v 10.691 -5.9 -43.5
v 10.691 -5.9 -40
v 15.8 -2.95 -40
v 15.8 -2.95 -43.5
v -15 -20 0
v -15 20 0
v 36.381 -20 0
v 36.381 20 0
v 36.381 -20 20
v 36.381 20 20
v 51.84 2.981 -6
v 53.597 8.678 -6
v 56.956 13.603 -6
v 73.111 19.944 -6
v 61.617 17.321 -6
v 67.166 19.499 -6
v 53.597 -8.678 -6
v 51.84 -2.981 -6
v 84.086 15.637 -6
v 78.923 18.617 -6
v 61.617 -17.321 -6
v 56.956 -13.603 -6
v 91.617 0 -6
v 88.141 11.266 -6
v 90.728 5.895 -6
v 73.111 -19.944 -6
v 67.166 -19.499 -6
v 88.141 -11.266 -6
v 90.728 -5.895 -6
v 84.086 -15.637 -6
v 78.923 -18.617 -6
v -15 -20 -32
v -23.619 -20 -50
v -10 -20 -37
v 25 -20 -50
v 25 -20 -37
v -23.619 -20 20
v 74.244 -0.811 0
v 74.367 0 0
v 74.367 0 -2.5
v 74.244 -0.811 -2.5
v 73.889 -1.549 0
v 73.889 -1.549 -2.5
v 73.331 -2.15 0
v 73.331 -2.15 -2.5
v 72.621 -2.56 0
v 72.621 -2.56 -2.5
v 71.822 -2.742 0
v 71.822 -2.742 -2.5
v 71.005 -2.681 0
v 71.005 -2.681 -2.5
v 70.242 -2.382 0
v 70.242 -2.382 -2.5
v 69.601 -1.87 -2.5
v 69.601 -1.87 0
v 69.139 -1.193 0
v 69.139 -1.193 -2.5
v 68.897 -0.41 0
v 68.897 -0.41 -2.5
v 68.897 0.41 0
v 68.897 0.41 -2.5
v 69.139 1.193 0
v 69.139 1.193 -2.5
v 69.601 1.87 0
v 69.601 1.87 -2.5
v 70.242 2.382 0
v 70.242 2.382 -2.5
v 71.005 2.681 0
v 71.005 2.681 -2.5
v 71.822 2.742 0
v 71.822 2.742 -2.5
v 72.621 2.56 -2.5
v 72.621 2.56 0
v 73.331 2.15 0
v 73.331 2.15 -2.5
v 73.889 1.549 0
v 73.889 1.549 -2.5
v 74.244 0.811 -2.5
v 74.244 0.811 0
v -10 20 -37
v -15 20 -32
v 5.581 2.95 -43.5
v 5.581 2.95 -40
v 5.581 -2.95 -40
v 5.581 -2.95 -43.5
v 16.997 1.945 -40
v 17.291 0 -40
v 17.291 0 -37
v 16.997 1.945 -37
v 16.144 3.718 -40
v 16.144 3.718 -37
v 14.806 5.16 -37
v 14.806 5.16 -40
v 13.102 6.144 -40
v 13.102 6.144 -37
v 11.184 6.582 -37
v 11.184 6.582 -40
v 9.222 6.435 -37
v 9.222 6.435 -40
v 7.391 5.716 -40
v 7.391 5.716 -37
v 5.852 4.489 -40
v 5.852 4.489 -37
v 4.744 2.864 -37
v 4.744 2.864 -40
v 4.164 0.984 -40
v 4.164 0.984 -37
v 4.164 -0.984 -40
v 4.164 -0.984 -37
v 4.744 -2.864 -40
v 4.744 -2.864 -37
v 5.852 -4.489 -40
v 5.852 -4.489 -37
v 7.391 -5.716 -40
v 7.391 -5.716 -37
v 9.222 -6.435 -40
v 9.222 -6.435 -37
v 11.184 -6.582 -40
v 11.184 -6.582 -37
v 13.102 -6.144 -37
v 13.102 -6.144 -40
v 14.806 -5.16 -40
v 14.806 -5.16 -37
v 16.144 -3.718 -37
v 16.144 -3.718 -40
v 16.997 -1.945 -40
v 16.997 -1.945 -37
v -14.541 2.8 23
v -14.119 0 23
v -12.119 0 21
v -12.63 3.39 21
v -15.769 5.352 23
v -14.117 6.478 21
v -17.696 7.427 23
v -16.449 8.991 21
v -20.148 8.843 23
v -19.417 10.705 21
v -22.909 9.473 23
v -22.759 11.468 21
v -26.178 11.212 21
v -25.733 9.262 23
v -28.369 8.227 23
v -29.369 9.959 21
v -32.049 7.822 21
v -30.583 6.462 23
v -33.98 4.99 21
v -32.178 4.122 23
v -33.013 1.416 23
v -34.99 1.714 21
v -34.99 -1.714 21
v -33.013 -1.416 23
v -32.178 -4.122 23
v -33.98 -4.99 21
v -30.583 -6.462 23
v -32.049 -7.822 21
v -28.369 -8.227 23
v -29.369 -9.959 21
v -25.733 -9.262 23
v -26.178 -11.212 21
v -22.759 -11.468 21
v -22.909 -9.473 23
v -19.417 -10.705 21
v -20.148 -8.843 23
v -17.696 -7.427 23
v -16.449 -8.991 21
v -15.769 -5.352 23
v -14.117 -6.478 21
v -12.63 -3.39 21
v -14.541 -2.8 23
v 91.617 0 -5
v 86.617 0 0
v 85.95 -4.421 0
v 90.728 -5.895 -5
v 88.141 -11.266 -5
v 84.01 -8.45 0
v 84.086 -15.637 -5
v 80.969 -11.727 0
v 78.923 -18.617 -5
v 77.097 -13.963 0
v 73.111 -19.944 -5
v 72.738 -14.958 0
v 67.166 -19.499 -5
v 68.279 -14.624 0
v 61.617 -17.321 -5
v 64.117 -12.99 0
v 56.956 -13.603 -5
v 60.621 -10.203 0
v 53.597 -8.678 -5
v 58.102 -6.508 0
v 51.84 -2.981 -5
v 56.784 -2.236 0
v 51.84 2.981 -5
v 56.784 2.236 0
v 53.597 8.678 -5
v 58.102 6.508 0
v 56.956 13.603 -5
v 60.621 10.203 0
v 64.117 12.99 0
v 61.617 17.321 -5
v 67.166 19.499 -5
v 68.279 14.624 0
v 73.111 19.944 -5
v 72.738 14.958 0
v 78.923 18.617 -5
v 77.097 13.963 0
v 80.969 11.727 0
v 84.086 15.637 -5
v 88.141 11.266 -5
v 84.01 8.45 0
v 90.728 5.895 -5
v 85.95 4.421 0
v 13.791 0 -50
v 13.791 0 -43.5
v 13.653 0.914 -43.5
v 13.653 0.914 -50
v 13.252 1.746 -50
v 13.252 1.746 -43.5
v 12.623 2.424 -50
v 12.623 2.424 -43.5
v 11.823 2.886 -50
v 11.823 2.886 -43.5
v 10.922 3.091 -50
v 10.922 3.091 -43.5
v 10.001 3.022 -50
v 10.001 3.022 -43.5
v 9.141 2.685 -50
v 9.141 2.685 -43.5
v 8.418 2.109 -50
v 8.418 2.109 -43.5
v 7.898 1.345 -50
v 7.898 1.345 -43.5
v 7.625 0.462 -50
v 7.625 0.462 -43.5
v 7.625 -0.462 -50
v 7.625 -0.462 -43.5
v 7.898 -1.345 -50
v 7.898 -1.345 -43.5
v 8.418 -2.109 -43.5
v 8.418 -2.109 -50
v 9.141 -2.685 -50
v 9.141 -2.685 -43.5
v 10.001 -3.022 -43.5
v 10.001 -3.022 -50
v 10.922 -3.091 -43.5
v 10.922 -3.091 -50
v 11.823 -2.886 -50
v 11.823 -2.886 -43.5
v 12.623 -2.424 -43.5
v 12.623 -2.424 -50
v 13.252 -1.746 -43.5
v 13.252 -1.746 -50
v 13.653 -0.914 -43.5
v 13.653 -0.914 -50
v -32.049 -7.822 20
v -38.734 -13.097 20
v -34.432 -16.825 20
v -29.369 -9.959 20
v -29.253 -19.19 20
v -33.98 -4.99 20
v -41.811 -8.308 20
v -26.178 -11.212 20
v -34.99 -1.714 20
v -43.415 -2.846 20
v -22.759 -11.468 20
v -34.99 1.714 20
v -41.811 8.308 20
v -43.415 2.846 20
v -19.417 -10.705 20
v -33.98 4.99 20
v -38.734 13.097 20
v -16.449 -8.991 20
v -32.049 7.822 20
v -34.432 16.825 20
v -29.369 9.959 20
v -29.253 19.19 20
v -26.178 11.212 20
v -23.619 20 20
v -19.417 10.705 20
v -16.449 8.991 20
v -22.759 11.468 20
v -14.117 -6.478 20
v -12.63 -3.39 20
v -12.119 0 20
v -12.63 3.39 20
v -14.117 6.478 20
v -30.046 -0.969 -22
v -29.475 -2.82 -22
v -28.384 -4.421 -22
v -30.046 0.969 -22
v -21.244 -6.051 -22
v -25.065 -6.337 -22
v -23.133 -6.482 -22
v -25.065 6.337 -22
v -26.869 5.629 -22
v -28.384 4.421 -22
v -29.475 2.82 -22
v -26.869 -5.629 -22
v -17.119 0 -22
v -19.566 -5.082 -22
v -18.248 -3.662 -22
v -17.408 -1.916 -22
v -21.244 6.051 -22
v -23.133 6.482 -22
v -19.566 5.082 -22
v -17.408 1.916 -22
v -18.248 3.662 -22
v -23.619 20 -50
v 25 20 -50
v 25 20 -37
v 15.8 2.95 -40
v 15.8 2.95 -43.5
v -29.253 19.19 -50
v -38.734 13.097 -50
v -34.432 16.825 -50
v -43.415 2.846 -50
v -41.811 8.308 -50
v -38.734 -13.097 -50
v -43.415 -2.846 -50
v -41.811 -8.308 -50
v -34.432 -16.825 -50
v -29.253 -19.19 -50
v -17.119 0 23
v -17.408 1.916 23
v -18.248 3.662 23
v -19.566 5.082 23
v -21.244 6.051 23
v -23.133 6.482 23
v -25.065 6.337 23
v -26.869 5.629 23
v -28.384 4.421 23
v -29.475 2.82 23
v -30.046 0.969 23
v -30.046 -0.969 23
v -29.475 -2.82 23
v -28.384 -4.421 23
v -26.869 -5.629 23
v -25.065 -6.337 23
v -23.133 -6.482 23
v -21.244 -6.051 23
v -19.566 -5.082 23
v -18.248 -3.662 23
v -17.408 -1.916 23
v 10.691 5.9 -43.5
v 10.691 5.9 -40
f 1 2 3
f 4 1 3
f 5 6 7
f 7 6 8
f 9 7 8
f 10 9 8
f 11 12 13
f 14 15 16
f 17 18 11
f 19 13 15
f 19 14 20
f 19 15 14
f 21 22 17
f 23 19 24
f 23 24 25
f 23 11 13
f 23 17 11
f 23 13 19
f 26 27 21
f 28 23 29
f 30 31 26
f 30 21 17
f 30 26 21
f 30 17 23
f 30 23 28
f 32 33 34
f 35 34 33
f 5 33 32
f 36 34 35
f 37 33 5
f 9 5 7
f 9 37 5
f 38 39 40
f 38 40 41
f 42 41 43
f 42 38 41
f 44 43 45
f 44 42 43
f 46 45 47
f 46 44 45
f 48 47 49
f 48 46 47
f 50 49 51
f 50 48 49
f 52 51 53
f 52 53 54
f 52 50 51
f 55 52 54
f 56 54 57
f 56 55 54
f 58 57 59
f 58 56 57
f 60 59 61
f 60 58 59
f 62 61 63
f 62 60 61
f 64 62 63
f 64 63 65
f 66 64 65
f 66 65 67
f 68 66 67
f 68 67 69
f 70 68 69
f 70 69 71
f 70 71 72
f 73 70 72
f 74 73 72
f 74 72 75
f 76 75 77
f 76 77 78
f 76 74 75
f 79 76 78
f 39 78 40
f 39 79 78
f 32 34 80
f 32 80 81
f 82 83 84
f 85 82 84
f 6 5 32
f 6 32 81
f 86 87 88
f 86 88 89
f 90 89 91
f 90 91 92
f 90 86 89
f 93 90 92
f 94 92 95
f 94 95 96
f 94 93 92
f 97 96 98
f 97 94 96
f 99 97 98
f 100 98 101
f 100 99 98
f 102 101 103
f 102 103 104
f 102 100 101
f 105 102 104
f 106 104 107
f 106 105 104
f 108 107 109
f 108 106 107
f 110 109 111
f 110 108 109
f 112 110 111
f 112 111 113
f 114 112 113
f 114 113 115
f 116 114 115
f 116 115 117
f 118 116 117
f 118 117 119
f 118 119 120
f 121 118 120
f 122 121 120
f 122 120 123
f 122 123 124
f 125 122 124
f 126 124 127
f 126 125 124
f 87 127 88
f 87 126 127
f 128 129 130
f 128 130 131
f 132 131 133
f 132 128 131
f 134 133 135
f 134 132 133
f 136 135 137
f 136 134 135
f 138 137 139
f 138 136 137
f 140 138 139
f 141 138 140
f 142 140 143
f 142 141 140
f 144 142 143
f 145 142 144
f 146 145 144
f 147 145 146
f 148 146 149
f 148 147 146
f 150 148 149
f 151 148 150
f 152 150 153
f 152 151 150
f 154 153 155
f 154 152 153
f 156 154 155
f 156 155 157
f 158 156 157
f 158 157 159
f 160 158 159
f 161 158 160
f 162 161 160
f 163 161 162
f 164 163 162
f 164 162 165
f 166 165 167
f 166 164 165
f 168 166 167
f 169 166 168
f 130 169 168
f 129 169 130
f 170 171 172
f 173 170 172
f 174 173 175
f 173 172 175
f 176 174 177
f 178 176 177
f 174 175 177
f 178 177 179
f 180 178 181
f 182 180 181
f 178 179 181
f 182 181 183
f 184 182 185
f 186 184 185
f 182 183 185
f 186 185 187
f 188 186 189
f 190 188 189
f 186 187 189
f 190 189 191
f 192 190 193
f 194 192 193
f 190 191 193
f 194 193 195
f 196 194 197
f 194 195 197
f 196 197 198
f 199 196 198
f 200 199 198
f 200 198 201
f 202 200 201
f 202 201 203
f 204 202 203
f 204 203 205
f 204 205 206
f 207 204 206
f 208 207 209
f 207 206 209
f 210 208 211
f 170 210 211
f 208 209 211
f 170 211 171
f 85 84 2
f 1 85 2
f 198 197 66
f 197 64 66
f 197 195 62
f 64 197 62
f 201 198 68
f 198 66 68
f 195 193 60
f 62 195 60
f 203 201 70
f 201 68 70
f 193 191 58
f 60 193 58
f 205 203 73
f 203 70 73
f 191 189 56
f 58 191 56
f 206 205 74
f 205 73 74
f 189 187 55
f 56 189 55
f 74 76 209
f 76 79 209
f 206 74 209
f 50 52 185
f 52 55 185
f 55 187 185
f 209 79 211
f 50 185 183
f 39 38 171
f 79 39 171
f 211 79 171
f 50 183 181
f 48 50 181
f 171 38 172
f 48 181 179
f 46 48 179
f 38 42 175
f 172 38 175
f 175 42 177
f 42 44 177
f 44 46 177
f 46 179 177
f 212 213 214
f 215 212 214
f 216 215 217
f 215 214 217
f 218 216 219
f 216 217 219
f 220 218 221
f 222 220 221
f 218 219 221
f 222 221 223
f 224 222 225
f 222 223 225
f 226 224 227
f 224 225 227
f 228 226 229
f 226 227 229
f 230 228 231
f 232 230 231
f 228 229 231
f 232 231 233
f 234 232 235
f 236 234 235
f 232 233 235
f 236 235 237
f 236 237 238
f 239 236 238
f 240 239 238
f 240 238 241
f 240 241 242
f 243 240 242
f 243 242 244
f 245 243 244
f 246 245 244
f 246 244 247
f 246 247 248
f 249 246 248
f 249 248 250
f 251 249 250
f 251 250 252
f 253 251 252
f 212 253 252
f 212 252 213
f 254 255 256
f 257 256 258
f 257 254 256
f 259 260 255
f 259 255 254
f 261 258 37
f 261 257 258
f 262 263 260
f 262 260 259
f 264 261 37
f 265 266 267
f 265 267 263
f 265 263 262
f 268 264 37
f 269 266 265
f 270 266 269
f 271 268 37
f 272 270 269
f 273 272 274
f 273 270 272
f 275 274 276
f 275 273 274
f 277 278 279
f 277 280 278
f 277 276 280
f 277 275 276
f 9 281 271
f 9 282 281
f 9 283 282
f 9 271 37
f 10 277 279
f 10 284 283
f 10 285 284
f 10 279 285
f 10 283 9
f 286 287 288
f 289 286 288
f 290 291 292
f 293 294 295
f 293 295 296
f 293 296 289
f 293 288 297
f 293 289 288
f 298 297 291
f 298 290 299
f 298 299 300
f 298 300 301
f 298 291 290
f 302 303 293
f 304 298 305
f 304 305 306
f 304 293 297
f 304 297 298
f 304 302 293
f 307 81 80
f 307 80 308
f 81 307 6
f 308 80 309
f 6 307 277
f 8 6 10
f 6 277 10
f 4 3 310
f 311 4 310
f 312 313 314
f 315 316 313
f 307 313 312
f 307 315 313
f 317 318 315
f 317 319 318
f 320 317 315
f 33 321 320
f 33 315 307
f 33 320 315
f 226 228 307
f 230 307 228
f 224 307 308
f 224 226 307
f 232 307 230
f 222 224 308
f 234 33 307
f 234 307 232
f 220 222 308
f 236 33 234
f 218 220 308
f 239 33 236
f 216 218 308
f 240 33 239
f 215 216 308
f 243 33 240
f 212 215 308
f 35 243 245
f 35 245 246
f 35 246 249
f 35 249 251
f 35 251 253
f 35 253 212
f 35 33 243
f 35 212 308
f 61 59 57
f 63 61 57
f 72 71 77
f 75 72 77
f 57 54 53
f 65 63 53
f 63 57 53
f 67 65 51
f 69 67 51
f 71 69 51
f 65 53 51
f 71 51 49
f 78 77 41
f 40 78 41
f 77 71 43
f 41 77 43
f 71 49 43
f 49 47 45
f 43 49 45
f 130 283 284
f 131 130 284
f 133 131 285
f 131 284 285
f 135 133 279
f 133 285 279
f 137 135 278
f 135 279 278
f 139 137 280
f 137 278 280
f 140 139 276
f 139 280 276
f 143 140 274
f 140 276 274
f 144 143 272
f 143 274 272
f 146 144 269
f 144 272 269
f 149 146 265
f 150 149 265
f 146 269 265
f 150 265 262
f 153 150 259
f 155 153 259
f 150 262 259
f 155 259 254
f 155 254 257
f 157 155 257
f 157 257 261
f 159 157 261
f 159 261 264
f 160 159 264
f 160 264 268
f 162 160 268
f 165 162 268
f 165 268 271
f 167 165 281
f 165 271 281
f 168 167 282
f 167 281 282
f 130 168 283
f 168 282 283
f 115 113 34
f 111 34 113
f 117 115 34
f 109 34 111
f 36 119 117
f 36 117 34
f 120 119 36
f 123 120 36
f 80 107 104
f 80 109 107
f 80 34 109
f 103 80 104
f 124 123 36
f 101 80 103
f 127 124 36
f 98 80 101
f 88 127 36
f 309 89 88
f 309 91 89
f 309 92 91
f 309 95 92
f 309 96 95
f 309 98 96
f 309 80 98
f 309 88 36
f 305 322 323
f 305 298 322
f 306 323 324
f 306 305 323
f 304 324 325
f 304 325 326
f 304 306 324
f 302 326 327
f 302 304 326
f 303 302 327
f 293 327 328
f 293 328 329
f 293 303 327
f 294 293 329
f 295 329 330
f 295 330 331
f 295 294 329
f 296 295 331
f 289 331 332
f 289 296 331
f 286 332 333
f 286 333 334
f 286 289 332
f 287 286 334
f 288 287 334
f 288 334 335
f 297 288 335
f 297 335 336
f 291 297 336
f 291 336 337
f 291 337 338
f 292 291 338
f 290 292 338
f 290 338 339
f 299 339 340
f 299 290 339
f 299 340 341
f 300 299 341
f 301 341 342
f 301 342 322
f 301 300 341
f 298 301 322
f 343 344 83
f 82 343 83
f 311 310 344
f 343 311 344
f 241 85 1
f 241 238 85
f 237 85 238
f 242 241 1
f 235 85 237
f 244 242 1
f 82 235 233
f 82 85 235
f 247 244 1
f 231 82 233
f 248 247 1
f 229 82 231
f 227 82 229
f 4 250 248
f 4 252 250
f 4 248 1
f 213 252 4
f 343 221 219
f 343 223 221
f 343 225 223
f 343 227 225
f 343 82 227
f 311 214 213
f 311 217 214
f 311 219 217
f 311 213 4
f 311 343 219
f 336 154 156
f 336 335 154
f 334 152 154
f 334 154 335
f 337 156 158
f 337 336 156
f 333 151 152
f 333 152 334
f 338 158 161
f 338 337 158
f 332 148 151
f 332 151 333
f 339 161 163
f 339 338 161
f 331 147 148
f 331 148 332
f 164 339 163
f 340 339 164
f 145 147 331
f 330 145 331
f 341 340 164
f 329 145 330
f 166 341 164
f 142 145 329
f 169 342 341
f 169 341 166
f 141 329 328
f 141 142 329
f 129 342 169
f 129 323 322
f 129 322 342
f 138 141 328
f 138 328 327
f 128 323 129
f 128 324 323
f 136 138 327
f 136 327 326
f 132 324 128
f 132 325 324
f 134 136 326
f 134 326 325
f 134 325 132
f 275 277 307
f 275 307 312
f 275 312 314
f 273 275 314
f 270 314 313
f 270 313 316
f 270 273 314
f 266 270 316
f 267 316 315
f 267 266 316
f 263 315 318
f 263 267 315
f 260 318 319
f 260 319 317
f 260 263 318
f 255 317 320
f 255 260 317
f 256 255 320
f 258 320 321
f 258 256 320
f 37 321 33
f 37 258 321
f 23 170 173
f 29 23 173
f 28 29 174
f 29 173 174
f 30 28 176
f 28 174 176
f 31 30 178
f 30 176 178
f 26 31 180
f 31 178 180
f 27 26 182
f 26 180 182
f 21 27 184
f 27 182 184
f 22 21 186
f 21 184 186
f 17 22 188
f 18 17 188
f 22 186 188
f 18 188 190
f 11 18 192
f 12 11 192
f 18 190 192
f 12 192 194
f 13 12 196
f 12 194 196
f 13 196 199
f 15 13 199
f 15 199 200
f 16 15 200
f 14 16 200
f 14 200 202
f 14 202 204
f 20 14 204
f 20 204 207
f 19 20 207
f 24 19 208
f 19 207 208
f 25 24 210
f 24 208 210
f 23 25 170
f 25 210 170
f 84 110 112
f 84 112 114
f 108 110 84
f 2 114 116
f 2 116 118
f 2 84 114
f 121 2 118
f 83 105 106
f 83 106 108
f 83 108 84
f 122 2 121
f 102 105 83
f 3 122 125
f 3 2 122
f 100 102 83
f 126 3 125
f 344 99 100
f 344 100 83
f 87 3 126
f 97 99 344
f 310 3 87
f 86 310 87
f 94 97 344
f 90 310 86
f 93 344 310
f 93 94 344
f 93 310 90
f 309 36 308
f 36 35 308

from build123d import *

# Parameters (mm, degrees)
F0_R      = 6.5
F1_DEPTH  = 20
F3_DEPTH  = 50
F4_DEPTH  = 22
F5_W      = 40
F5_H      = 40
F6_DEPTH  = 10
F7_R      = 11.5
F7_R_2    = 6.5
F8_DEPTH  = 3
F9_SIZE   = 2
F11_DEPTH = 3.5
F10_W     = 40
F10_H     = 40
F10_R     = 6.6
F12_DEPTH = 3
F13_DEPTH = 3
F14_D     = 6.2
F14_DEPTH = 10.001
F15_R     = 20
F15_R_2   = 2.75
F16_DEPTH = 6
F17_SIZE  = 5
F18_DEPTH = 2.5
F19_ANGLE = 180
F21_DEPTH = 40


with BuildPart() as f1:
    # F0 (on Top) → F1 (new body)
    with BuildSketch(Plane.XY):
        with BuildLine():
            Line((36.3812413297, 20), (-23.6187586703, 20))
            ThreePointArc((-23.6187586703, 20), (-9.4766230466, 14.1421356237), (-3.6187586703, 0))
            ThreePointArc((-3.6187586703, 0), (-9.4766230466, -14.1421356237), (-23.6187586703, -20))
            Line((-23.6187586703, -20), (36.3812413297, -20))
            Line((36.3812413297, -20), (36.3812413297, 20))
        make_face()
        with BuildLine():
            ThreePointArc((-3.6187586703, 0), (-9.4766230466, 14.1421356237), (-23.6187586703, 20))
            ThreePointArc((-23.6187586703, 20), (-43.6187586703, 0), (-23.6187586703, -20))
            ThreePointArc((-23.6187586703, -20), (-9.4766230466, -14.1421356237), (-3.6187586703, 0))
        make_face()
        with Locations((-23.6187586703, 0)):
            Circle(F0_R, mode=Mode.SUBTRACT)
    extrude(amount=F1_DEPTH)

    # F2 (on Top) → F3 (join)
    with BuildSketch(Plane.XY):
        with BuildLine():
            Line((-15, -20), (-15, 20))
            Line((-15, 20), (-23.6187586703, 20))
            ThreePointArc((-23.6187586703, 20), (-43.6187586703, 0), (-23.6187586703, -20))
            Line((-23.6187586703, -20), (-15, -20))
        make_face()
    extrude(amount=-F3_DEPTH)

    # F0 (on Top) → F4 (cut)
    with BuildSketch(Plane.XY):
        with Locations((-23.6187586703, 0)):
            Circle(F0_R)
    extrude(amount=-F4_DEPTH, mode=Mode.SUBTRACT)

    # F5 (on face) → F6 (join)
    with BuildSketch(Plane(origin=(0, 0, -50), x_dir=(1, 0, 0), z_dir=(0, 0, -1))):
        with Locations((5, 0)):
            Rectangle(F5_W, F5_H)
    extrude(amount=-F6_DEPTH)

    # F7 (on face) → F8 (join)
    with BuildSketch(Plane.XY.offset(20)):
        with Locations((-23.6187586703, 0)):
            Circle(F7_R)
        with Locations((-23.6187586703, 0)):
            Circle(F7_R_2, mode=Mode.SUBTRACT)
    extrude(amount=F8_DEPTH)

    # F9
    f9_edges = [f1.edges().sort_by_distance(p)[0] for p in [
        (-35.118759, 0, 23),
    ]]
    chamfer(f9_edges, length=F9_SIZE)

    # F10 (on face) → F11 (cut)
    with BuildSketch(Plane.XY.offset(-40)):
        Polygon((5.5810707825, 2.95), (5.5810707825, -2.95), (10.6906206648, -5.9), (15.8001705472, -2.95), (15.8001705472, 2.95), (10.6906206648, 5.9), align=None)
    extrude(amount=-F11_DEPTH, mode=Mode.SUBTRACT)

    # F10 (on face) → F12 (join)
    with BuildSketch(Plane.XY.offset(-40)):
        with Locations((5, 0)):
            Rectangle(F10_W, F10_H)
        with Locations((10.6906206648, 0)):
            Circle(F10_R, mode=Mode.SUBTRACT)
        with Locations((10.6906206648, 0)):
            Circle(F10_R)
        Polygon((10.6906206648, -5.9), (5.5810707825, -2.95), (5.5810707825, 2.95), (10.6906206648, 5.9), (15.8001705472, 2.95), (15.8001705472, -2.95), align=None, mode=Mode.SUBTRACT)
        Polygon((5.5810707825, 2.95), (5.5810707825, -2.95), (10.6906206648, -5.9), (15.8001705472, -2.95), (15.8001705472, 2.95), (10.6906206648, 5.9), align=None)
    extrude(amount=F12_DEPTH)

    # F10 (on face) → F13 (cut)
    with BuildSketch(Plane.XY.offset(-40)):
        with Locations((10.6906206648, 0)):
            Circle(F10_R)
        Polygon((10.6906206648, -5.9), (5.5810707825, -2.95), (5.5810707825, 2.95), (10.6906206648, 5.9), (15.8001705472, 2.95), (15.8001705472, -2.95), align=None, mode=Mode.SUBTRACT)
        Polygon((5.5810707825, 2.95), (5.5810707825, -2.95), (10.6906206648, -5.9), (15.8001705472, -2.95), (15.8001705472, 2.95), (10.6906206648, 5.9), align=None)
    extrude(amount=F13_DEPTH, mode=Mode.SUBTRACT)

    # F14 (through all, one way)
    with BuildSketch(Plane.XY.offset(-40)):
        with Locations((10.6906206648, 0)):
            Circle(F14_D / 2)
    extrude(amount=-F14_DEPTH, mode=Mode.SUBTRACT)

    # F20 (on face) → F21 (join)
    with BuildSketch(Plane.XZ.offset(20)):
        Polygon((-15, -32), (-15, -37), (-10, -37), align=None)
    extrude(amount=-F21_DEPTH)


with BuildPart() as f16:
    # F15 (on Top) → F16 (new body)
    with BuildSketch(Plane.XY):
        with Locations((71.6166347265, 0)):
            Circle(F15_R)
        with Locations((71.6166347265, 0)):
            Circle(F15_R_2, mode=Mode.SUBTRACT)
        with Locations((71.6166347265, 0)):
            Circle(F15_R_2)
    extrude(amount=F16_DEPTH)

    # F17
    f17_edges = [f16.edges().sort_by_distance(p)[0] for p in [
        (51.616635, 0, 0),
    ]]
    chamfer(f17_edges, length=F17_SIZE)

    # F15 (on Top) → F18 (cut)
    with BuildSketch(Plane.XY):
        with Locations((71.6166347265, 0)):
            Circle(F15_R_2)
    extrude(amount=F18_DEPTH, mode=Mode.SUBTRACT)


with BuildPart() as f16_1:
    # F19: moved
    add(f16.part.rotate(Axis((-1.4796741307, 0, 0), (1, 0, 0)), F19_ANGLE))


solid = Compound([f1.part, f16_1.part])
